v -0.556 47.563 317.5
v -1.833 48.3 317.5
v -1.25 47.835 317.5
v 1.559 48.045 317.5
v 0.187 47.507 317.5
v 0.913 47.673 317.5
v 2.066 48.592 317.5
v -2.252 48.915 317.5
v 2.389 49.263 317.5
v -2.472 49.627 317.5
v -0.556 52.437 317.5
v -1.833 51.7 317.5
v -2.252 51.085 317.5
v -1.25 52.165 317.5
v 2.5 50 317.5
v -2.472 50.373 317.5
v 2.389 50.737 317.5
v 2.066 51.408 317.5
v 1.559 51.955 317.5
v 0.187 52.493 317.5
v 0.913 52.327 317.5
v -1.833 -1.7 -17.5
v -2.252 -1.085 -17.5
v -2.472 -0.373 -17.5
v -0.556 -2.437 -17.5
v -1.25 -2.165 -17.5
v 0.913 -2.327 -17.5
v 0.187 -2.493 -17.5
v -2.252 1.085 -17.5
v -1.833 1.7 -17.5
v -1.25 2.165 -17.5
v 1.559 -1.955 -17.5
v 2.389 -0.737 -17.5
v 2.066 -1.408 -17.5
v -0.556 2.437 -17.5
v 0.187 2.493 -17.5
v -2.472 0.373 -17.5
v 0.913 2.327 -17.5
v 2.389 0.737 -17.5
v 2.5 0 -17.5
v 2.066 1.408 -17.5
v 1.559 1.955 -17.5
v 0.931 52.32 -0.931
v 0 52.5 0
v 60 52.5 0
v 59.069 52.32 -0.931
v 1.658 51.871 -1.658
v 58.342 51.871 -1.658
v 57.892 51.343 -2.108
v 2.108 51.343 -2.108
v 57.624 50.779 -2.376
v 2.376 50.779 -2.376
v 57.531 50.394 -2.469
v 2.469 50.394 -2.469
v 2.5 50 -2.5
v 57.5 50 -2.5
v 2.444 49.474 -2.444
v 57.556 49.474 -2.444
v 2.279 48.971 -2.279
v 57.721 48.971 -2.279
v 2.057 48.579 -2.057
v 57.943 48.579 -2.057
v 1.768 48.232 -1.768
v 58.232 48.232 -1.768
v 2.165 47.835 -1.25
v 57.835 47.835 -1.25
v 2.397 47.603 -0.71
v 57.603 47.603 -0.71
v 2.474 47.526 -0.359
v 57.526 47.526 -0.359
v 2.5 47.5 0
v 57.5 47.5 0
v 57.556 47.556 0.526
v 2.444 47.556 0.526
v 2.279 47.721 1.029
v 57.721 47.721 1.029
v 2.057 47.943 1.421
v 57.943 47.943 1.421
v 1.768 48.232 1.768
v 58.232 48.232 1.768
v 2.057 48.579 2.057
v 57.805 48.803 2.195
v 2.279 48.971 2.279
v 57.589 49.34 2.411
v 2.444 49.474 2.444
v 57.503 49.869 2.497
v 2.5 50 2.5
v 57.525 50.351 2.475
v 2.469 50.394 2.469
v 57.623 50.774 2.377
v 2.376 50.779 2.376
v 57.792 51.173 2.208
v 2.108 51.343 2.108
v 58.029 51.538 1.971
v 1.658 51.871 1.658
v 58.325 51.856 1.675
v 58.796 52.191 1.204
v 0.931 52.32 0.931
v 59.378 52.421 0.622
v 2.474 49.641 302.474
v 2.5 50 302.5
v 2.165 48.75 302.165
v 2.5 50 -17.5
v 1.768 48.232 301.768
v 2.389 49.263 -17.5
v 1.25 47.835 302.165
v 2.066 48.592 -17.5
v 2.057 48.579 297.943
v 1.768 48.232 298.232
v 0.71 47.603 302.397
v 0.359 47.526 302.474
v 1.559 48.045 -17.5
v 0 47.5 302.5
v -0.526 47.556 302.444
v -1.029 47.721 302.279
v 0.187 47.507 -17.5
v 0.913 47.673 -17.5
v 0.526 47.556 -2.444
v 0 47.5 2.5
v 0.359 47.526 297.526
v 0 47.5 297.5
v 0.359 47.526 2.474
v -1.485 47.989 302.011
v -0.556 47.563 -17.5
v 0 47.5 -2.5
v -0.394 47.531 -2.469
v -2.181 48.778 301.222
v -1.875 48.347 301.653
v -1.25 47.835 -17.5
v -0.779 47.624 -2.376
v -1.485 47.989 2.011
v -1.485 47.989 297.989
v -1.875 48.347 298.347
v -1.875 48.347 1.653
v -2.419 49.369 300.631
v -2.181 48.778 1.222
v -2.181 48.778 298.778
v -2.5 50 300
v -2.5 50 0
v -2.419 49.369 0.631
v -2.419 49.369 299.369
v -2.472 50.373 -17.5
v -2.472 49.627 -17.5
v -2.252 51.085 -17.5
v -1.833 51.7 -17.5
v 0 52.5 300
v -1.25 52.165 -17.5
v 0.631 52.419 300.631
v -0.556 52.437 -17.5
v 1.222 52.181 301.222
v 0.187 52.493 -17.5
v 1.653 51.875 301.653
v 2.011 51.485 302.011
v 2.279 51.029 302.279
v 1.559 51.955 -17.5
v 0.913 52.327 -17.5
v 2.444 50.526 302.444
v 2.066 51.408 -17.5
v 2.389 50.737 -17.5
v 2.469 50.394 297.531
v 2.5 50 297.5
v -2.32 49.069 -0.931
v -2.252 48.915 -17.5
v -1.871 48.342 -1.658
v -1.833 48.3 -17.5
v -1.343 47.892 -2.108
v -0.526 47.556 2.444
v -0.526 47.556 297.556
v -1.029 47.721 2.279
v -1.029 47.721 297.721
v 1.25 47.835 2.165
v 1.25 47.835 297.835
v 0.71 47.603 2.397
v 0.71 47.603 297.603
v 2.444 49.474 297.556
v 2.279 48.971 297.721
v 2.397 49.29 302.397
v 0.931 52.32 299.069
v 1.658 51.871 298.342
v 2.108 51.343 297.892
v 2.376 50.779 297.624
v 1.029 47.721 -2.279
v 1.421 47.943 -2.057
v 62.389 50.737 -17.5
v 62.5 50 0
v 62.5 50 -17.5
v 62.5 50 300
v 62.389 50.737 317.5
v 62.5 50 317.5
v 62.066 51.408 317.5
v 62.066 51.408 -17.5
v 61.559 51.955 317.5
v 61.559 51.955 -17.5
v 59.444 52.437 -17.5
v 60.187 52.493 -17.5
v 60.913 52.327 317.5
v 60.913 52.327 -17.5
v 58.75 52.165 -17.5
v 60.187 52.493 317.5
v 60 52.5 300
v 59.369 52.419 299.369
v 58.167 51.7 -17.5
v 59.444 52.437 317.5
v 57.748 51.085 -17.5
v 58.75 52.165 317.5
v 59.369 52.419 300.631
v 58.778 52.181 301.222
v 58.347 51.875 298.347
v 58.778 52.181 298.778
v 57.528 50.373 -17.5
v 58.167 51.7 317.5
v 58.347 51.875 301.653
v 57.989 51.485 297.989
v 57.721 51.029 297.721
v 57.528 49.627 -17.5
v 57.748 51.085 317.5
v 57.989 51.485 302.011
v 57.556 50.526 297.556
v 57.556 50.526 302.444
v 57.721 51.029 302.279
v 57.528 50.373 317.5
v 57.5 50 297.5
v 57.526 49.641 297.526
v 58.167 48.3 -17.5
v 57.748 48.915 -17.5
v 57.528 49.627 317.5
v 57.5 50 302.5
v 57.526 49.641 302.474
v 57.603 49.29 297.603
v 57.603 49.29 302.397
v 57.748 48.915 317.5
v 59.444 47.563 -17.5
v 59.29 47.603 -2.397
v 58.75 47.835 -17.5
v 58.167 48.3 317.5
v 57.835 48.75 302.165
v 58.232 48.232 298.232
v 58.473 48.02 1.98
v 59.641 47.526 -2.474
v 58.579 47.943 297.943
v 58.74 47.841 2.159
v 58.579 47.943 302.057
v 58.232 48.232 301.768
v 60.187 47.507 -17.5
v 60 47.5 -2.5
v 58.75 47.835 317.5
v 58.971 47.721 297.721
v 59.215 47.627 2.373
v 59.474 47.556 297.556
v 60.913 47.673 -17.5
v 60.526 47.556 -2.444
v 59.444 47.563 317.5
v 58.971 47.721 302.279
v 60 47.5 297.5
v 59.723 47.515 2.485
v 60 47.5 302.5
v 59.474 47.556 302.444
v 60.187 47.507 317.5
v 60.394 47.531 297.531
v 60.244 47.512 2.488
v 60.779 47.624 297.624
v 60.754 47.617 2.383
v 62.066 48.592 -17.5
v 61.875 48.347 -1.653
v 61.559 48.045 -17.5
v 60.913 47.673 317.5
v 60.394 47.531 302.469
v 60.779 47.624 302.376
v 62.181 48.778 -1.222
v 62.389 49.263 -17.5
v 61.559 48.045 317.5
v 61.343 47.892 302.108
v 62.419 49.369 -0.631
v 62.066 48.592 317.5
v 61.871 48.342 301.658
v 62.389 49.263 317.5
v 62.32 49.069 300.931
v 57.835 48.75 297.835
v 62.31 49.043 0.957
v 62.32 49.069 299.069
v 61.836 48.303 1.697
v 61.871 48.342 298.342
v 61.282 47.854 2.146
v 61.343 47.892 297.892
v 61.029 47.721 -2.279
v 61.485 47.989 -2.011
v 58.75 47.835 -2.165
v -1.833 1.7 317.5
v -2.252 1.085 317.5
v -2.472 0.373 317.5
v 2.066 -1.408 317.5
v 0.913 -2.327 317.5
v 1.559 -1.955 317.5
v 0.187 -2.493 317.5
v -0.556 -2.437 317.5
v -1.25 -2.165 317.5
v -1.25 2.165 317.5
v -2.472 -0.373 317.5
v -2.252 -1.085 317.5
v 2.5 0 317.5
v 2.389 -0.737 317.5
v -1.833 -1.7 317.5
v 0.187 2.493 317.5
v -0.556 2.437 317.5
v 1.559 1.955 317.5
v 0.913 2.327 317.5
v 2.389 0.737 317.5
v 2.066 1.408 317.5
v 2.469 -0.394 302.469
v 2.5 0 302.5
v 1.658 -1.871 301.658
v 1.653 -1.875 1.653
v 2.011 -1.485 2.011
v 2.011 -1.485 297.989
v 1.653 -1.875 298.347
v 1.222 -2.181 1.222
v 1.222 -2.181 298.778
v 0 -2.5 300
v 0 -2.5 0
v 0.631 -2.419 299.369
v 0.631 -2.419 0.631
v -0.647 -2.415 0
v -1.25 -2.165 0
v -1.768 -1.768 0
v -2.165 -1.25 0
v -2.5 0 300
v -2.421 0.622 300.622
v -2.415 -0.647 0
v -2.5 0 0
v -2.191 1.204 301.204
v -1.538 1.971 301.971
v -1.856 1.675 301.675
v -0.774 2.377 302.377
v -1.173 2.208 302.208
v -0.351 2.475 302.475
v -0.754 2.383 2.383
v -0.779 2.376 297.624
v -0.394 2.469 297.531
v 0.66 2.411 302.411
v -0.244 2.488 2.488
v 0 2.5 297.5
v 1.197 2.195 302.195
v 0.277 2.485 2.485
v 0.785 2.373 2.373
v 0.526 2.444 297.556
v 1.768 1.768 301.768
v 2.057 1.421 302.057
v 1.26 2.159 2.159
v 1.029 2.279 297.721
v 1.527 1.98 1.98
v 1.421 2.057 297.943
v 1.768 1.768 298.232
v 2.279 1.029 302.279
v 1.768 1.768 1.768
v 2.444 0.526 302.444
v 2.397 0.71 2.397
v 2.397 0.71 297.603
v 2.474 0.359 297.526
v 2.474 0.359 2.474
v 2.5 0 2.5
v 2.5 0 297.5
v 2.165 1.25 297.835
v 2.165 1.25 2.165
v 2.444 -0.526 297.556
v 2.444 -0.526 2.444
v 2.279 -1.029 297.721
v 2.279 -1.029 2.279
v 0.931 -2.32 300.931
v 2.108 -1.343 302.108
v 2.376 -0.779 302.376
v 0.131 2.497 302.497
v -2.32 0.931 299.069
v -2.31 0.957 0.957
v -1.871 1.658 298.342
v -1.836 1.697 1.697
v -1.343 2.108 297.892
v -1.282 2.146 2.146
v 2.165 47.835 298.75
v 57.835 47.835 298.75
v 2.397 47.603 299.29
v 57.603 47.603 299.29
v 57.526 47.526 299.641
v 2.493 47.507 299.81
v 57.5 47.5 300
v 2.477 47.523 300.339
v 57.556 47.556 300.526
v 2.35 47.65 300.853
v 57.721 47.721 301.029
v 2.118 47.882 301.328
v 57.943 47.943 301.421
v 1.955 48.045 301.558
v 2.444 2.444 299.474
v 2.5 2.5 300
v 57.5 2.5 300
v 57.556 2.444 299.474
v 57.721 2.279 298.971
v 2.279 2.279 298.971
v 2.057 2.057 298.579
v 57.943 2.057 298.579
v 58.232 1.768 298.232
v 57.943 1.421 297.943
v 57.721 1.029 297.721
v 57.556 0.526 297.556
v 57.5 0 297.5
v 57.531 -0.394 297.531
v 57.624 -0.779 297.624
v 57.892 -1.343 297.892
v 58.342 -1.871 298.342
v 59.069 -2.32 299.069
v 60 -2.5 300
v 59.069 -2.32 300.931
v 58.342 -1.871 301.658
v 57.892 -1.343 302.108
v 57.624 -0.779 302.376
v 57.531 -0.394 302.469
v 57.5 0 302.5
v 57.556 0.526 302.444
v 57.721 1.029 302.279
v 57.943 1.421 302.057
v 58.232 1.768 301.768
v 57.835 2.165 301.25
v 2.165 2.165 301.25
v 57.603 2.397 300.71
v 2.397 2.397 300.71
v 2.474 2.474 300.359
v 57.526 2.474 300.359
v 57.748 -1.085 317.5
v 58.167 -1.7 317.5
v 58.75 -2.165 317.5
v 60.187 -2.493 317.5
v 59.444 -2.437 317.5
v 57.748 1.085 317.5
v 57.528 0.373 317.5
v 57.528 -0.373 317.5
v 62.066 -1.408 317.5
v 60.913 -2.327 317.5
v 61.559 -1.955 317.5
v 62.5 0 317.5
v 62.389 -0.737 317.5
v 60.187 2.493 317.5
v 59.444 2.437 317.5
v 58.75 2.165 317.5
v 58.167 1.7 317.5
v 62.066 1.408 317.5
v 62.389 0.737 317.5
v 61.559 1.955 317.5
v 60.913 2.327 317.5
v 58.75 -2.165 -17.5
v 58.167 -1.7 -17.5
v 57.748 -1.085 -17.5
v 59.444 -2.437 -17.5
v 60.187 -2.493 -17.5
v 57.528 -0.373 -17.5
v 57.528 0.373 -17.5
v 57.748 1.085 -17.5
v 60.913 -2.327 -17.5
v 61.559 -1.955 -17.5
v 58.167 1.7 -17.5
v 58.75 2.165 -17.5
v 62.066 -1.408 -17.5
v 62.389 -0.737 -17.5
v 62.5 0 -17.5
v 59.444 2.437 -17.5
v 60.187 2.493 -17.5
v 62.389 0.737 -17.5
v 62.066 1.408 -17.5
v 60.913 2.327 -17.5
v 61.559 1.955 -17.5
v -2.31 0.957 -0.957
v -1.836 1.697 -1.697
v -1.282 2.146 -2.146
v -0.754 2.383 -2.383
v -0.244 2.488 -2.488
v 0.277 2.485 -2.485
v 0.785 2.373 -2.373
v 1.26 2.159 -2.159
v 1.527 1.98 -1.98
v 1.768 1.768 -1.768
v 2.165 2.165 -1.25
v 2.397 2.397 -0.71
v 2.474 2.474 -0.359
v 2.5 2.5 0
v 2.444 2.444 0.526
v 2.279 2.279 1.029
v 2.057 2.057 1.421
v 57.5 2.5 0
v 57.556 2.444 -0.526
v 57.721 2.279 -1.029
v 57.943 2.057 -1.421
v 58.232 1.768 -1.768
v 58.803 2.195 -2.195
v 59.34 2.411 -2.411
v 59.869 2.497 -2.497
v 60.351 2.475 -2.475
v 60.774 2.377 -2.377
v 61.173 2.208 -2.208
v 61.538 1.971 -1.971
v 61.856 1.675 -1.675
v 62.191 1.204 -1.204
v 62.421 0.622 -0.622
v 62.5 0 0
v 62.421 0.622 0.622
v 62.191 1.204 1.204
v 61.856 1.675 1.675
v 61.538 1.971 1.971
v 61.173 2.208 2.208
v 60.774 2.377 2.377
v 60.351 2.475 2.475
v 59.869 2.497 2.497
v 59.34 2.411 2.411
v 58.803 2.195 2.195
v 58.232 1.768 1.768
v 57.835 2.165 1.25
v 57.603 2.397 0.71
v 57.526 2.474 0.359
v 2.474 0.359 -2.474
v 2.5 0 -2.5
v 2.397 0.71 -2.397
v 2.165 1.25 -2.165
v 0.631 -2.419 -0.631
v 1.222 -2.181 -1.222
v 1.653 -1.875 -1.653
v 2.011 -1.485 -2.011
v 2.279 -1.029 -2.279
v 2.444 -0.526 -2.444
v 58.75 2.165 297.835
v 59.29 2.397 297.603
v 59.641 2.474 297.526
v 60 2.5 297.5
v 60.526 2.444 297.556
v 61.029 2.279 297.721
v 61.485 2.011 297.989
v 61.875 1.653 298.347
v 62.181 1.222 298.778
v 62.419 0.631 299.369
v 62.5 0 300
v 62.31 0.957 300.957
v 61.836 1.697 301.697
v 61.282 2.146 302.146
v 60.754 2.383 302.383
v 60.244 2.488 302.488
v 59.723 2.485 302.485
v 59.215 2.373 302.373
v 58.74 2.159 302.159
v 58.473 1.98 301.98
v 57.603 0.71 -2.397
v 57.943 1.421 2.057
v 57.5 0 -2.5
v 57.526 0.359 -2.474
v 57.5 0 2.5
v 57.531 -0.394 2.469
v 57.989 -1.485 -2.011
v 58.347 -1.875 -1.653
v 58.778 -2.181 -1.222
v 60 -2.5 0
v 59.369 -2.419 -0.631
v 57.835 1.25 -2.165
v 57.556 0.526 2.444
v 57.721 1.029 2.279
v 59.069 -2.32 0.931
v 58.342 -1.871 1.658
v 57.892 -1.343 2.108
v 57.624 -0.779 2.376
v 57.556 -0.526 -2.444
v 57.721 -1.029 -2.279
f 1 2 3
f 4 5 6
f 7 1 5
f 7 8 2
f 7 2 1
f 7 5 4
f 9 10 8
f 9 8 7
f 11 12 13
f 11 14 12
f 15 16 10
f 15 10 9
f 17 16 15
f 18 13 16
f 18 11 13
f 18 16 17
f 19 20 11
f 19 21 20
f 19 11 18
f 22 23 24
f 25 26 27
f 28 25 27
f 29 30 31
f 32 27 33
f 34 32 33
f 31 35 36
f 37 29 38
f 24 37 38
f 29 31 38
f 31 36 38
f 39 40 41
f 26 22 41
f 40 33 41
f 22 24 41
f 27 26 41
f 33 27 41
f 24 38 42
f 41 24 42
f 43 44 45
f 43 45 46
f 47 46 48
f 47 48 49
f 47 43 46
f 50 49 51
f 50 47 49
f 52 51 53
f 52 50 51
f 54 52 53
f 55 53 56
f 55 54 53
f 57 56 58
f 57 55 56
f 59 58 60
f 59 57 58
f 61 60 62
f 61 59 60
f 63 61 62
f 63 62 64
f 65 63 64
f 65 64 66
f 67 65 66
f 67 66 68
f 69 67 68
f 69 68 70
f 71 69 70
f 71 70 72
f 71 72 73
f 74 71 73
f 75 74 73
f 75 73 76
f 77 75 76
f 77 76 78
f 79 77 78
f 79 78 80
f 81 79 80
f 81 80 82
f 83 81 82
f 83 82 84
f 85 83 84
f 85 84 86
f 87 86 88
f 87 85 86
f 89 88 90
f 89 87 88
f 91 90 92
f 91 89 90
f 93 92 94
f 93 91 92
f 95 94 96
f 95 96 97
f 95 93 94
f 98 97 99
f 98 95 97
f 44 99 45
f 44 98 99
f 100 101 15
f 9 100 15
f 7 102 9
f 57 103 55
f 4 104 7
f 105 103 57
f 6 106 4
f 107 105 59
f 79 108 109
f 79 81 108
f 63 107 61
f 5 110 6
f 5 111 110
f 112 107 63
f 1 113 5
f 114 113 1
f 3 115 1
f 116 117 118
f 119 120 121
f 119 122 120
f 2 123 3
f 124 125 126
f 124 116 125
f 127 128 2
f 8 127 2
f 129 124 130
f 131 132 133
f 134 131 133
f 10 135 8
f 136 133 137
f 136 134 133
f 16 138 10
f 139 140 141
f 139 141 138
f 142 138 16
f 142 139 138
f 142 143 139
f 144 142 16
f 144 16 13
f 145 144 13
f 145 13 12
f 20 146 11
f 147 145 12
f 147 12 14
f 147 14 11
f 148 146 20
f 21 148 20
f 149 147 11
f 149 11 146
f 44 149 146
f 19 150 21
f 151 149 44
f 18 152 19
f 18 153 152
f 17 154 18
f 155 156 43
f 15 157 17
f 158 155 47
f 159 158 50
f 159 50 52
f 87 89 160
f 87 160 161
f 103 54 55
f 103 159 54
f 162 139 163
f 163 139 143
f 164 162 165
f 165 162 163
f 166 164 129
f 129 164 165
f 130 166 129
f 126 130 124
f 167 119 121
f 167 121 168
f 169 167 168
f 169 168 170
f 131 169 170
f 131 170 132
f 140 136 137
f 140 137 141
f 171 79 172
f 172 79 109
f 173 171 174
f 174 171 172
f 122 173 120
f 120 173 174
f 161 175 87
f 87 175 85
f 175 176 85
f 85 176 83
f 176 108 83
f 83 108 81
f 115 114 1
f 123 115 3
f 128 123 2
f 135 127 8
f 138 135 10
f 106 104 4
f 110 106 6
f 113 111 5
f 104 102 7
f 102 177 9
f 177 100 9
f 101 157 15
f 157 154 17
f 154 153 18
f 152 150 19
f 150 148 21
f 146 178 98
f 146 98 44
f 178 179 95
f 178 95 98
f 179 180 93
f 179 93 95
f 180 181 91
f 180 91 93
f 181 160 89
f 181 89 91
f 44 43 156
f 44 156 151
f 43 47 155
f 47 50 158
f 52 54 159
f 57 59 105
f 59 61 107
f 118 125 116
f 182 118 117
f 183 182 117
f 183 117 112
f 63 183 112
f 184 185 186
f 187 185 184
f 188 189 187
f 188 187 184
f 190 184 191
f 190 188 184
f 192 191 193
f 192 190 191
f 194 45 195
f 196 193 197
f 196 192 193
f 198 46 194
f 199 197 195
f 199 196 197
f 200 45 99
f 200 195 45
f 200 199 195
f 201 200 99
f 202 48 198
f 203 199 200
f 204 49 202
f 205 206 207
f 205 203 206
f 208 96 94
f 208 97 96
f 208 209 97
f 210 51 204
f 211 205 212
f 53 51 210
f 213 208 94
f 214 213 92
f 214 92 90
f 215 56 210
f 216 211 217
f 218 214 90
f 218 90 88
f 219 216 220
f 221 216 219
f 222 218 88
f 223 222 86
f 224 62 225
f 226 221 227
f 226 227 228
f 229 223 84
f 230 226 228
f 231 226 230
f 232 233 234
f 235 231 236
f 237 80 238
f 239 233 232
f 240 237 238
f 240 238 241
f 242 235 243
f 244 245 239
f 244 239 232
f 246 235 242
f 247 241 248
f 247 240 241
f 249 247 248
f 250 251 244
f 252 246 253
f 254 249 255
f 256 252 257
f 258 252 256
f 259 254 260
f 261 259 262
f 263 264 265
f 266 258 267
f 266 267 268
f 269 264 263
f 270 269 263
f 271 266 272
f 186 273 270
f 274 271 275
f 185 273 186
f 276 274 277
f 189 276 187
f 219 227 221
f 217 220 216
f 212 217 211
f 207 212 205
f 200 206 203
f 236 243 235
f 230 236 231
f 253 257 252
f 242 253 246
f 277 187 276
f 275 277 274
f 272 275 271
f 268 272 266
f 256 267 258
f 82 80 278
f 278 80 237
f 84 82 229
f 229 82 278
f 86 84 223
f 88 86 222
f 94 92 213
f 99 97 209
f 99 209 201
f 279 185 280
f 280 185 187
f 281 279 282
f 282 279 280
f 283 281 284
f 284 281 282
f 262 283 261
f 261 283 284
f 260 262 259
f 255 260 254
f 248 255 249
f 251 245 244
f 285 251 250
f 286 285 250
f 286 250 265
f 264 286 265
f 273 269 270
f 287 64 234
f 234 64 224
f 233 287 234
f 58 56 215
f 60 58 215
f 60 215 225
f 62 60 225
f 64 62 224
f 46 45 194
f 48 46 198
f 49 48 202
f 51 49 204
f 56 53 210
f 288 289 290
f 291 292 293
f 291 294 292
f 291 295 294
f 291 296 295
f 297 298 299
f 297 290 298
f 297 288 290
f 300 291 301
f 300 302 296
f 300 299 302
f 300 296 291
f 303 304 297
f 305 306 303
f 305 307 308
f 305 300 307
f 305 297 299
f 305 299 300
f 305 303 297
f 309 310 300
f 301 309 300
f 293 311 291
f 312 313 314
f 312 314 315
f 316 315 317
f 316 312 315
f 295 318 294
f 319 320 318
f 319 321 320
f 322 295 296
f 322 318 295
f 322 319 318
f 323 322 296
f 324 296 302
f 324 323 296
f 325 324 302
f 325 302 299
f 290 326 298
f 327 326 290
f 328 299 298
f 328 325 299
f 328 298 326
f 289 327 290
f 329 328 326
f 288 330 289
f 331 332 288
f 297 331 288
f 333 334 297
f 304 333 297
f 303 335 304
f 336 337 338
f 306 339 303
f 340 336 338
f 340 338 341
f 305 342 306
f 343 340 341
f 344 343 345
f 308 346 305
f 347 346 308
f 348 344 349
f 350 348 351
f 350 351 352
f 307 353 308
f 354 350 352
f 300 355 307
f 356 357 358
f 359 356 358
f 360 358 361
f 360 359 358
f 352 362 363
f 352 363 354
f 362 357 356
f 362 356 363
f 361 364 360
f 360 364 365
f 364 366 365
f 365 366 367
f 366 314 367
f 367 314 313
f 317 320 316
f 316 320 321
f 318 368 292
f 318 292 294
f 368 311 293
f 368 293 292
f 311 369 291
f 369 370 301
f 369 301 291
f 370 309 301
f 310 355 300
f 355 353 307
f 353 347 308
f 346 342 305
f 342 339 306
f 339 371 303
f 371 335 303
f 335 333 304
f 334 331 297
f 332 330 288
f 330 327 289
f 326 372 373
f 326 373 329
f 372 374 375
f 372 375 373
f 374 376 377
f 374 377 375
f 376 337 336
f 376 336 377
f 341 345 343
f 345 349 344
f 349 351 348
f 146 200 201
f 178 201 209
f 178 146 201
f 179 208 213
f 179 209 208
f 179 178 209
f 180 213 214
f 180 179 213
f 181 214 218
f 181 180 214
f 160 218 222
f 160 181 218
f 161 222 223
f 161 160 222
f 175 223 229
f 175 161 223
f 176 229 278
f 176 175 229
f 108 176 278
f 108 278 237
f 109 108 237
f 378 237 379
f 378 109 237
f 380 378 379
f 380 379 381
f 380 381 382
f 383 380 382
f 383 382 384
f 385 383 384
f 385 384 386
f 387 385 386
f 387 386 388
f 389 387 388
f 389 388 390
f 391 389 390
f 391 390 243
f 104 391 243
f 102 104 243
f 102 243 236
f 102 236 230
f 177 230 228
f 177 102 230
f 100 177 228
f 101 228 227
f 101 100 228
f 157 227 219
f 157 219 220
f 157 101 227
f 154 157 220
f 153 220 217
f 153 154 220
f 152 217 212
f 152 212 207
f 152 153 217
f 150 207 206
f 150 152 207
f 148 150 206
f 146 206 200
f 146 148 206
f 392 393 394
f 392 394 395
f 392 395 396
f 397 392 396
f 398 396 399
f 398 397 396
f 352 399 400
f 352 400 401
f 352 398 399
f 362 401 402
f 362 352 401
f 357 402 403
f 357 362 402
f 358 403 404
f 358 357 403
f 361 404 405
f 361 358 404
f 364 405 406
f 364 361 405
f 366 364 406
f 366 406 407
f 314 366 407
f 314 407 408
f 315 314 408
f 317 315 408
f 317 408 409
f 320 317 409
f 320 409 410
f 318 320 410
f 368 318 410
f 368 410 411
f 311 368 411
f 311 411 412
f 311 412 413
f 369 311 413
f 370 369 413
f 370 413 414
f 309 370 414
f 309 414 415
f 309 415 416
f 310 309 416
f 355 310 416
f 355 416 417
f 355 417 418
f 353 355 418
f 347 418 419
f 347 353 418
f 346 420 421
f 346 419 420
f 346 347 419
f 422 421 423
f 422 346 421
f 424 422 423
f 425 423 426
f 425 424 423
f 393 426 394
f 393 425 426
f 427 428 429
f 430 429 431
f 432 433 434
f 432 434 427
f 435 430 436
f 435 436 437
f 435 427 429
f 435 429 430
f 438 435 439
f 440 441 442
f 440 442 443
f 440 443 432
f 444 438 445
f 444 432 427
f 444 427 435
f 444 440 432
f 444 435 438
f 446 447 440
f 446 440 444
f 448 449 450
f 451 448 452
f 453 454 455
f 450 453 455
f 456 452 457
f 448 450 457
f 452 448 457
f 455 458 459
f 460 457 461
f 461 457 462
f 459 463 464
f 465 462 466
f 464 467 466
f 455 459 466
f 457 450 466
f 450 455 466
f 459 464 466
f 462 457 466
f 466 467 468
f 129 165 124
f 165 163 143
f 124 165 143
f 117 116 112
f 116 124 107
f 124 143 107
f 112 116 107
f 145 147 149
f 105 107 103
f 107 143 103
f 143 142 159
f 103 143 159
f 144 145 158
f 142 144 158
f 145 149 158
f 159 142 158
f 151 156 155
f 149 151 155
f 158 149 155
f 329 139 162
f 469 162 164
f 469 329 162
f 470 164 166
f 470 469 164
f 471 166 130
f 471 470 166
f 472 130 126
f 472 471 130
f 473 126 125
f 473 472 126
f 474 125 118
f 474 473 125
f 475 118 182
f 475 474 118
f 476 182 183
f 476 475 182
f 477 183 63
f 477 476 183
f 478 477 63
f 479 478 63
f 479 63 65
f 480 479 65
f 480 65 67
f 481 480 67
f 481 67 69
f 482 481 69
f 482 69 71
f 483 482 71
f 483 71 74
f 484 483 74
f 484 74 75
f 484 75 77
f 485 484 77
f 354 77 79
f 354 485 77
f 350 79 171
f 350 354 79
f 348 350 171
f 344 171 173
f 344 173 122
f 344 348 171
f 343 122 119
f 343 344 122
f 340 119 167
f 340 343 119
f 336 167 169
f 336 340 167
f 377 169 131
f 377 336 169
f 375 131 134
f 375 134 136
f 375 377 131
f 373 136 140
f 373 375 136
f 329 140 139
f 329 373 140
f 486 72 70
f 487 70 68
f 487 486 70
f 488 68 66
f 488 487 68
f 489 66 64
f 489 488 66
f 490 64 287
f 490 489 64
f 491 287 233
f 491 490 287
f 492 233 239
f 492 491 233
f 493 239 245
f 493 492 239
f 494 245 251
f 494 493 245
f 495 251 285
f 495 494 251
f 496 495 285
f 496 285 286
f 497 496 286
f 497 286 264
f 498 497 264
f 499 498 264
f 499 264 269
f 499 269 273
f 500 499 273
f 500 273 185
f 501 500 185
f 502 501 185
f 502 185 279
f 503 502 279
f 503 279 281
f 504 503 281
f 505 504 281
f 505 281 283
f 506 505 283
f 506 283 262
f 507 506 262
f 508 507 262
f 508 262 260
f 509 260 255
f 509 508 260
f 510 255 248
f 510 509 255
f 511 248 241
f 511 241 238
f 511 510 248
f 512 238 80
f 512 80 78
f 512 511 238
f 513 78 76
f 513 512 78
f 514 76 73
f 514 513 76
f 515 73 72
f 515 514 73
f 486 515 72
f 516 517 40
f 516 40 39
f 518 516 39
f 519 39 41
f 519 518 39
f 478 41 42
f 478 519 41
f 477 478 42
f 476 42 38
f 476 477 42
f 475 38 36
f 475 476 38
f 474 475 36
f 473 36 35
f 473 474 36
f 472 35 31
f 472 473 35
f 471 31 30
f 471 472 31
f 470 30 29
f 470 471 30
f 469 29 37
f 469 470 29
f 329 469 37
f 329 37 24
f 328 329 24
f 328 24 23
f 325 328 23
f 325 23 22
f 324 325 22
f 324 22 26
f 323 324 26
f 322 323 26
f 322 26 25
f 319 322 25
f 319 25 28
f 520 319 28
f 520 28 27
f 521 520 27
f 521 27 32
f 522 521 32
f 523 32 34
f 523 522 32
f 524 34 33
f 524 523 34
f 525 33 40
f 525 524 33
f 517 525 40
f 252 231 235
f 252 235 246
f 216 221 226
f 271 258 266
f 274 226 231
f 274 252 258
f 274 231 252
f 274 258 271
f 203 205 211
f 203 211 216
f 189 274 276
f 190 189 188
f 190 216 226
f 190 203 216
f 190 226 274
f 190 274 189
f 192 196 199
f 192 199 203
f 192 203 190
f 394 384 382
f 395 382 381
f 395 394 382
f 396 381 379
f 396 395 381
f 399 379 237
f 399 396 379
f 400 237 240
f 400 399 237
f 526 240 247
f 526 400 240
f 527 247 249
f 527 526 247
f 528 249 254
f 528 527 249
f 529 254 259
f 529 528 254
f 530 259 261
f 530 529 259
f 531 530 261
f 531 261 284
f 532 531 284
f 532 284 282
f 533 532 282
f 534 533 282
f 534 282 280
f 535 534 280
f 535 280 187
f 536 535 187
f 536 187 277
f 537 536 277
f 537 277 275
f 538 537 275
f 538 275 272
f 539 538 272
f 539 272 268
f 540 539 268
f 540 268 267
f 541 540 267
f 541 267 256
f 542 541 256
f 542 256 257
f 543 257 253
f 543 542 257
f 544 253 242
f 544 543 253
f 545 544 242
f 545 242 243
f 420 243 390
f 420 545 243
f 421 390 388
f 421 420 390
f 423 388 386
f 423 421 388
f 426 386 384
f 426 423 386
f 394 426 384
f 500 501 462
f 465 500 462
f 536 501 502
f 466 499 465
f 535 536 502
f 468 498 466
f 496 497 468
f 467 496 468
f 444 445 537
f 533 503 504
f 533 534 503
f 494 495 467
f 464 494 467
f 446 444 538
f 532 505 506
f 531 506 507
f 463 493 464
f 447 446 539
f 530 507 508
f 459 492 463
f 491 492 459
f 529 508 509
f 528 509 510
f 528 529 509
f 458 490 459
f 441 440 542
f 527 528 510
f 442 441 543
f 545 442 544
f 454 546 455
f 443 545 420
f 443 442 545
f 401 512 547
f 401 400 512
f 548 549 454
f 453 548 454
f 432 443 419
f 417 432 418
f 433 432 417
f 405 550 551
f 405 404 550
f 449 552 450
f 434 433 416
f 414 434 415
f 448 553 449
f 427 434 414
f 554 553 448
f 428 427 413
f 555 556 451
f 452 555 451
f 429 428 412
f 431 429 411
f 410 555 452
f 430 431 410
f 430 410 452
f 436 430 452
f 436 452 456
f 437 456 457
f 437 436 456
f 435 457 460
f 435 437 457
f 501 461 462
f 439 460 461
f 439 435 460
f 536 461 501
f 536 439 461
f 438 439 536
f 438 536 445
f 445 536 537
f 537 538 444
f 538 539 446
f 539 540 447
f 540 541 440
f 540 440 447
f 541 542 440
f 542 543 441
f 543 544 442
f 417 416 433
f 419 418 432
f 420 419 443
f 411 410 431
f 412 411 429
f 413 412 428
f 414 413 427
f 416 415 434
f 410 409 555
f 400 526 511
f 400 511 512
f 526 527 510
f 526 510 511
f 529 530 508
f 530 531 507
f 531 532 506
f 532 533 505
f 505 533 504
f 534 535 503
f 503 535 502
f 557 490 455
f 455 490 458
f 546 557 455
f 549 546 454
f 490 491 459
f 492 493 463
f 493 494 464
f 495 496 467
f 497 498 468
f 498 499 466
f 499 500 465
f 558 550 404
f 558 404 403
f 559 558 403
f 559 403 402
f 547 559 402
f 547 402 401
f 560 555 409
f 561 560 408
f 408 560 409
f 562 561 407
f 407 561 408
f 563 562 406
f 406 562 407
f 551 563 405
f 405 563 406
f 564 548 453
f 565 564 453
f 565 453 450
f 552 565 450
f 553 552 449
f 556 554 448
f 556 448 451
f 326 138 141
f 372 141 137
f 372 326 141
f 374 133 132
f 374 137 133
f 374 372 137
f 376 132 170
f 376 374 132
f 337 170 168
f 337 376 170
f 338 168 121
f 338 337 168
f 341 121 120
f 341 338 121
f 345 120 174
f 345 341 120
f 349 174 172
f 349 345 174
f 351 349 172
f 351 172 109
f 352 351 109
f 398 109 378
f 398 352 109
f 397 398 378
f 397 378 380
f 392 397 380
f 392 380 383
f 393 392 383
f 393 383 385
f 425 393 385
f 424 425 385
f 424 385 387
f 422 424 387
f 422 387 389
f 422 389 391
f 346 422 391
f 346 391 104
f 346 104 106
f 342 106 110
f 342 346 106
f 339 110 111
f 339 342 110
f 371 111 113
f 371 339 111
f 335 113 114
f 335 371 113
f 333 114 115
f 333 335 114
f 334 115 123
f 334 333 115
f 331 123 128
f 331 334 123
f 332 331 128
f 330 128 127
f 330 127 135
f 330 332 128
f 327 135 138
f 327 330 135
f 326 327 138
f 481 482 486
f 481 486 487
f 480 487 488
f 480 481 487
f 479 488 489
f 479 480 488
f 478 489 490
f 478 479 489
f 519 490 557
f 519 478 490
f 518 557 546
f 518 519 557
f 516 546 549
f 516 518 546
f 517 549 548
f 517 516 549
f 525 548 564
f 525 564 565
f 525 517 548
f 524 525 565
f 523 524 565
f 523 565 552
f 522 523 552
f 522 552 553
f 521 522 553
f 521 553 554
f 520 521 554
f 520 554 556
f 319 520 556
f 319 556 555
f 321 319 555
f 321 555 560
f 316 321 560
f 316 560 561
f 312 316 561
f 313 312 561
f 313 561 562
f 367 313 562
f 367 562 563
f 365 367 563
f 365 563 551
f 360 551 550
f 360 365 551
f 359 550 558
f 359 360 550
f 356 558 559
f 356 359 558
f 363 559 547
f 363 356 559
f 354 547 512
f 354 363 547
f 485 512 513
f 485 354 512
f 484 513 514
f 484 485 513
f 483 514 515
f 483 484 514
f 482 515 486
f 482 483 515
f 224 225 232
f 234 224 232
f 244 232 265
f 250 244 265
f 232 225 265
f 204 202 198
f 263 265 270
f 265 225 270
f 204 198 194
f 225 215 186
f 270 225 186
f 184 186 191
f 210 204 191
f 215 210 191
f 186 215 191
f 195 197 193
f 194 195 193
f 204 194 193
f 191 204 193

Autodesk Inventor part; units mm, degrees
ref_plane "YZ Plane" through (0, 0, 0) normal (1, 0, 0) x (0, 1, 0)
ref_plane "XZ Plane" through (0, 0, 0) normal (0, 1, 0) x (-1, 0, 0)
sketch "Sketch1" plane through (0, 0, 0) normal (0, 0, 1) x (1, 0, 0)
  circle A0 centre (0, 0) radius 2.5
  circle A1 centre (0, 50) radius 2.5
  circle A2 centre (60, 50) radius 2.5
  circle A3 centre (60, 0) radius 2.5
  dimension "d0" = 5
  dimension "d11" = 5
  dimension "d12" = 5
  dimension "d13" = 5
sketch "Sketch2" plane through (0, 0, 0) normal (1, 0, 0) x (0, 1, 0)
  circle A0 centre (0, 0) radius 2.5
  circle A1 centre (50, 0) radius 2.5
  circle A2 centre (0, 300) radius 2.5
  circle A3 centre (50, 300) radius 2.5
  dimension "d1" = 5
  dimension "d27" = 5
  dimension "d35" = 5
  dimension "d36" = 5
sketch "Sketch3" plane through (0, 0, 0) normal (0, 1, 0) x (-1, 0, 0)
  circle A0 centre (0, 0) radius 2.5
  circle A1 centre (-60, 0) radius 2.5
  circle A2 centre (0, 300) radius 2.5
  circle A3 centre (-60, 300) radius 2.5
  dimension "d2" = 5
  dimension "d31" = 5
  dimension "d42" = 5
  dimension "d43" = 5
extrude "LongBL" add sketch "Sketch1" along normal blind 300 contours A0
extrude "SideBB" add sketch "Sketch3" along normal blind 50 contours A0
extrude "UpBL" add sketch "Sketch2" along normal blind 60 contours A0
extrude "LongBR" add sketch "Sketch1" along normal blind 300 contours A3
extrude "LongTL" add sketch "Sketch1" along normal blind 300 contours A1
extrude "LongTR" add sketch "Sketch1" along normal blind 300 contours A2
extrude "Extrusion9" add sketch "Sketch2" along normal blind 60 contours A1
extrude "Extrusion10" add sketch "Sketch3" along normal blind 50 contours A1
extrude "Extrusion11" add sketch "Sketch2" along normal blind 60 contours A3
extrude "Extrusion12" add sketch "Sketch2" along normal blind 60 contours A2
extrude "Extrusion13" add sketch "Sketch3" along normal blind 50 contours A3
extrude "Extrusion14" add sketch "Sketch3" along normal blind 50 contours A2
ref_plane "Work Plane3" through (-2.5, 0, 300) normal (0, 0, 1) x (1, 0, 0)
sketch "Sketch5" plane through (-2.5, 0, 300) normal (0, 0, 1) x (1, 0, 0)
  arc A0 (4.2678, 1.7678) -> (0, 0) centre (2.5, 0) ccw projected
  line L0 (0, 0) -> (2.5, 0) projected
  circle A1 centre (2.5, 0) radius 2.5
  line L1 (2.5, 50) -> (2.5, 52.5) projected
  circle A2 centre (2.5, 50) radius 2.5
  line L2 (62.5, 50) -> (60, 47.5) projected
  circle A3 centre (62.5, 50) radius 2.5
  arc A4 (60.7322, 1.7678) -> (62.5, -2.5) centre (62.5, 0) ccw projected
  circle A5 centre (62.5, 0) radius 2.5
  point P0 (60.7322, 48.2322)
  dimension "d48" = 5
  dimension "d49" = 5
  dimension "d50" = 5
  dimension "d51" = 5
extrude "FTLConnect" add sketch "Sketch5" along normal blind 17.5 contours A2
sketch "Sketch7" plane through (-2.5, 0, 300) normal (0, 0, 1) x (1, 0, 0)
  arc A0 (0, 0) -> (2.5, -2.5) centre (2.5, 0) ccw projected
  line L0 (2.5, -2.5) -> (2.5, 0) projected
  circle A1 centre (2.5, 0) radius 2.5
  line L1 (65, 50) -> (62.5, 50) projected
  circle A2 centre (62.5, 50) radius 2.5
  circle A3 centre (62.5, 0) radius 2.5
extrude "FTRConnect" add sketch "Sketch7" along normal blind 17.5 contours A2
sketch "Sketch8" plane through (-2.5, 0, 300) normal (0, 0, 1) x (1, 0, 0)
  line L0 (2.5, -2.5) -> (2.5, 0) projected
  circle A0 centre (2.5, 0) radius 2.5
  dimension "d56" = 5
extrude "FBLConnect" add sketch "Sketch8" along normal blind 17.5
sketch "Sketch9" plane through (-2.5, 0, 300) normal (0, 0, 1) x (1, 0, 0)
  circle A0 centre (62.5, 0) radius 2.5
  point P0 (2.5, 0)
  dimension "d59" = 5
extrude "FBRConnect" add sketch "Sketch9" along normal blind 17.5
extrude "BTRConnect" add sketch "Sketch1" against normal blind 17.5 contours A2
extrude "BTLConnect" add sketch "Sketch1" against normal blind 17.5 contours A1
extrude "BBRConnect" add sketch "Sketch1" against normal blind 17.5 contours A3
extrude "BBLConnect" add sketch "Sketch1" against normal blind 17.5 contours A0
properties part number "RCPlaneSkeletonModel1" material "PC/ABS Plastic"
